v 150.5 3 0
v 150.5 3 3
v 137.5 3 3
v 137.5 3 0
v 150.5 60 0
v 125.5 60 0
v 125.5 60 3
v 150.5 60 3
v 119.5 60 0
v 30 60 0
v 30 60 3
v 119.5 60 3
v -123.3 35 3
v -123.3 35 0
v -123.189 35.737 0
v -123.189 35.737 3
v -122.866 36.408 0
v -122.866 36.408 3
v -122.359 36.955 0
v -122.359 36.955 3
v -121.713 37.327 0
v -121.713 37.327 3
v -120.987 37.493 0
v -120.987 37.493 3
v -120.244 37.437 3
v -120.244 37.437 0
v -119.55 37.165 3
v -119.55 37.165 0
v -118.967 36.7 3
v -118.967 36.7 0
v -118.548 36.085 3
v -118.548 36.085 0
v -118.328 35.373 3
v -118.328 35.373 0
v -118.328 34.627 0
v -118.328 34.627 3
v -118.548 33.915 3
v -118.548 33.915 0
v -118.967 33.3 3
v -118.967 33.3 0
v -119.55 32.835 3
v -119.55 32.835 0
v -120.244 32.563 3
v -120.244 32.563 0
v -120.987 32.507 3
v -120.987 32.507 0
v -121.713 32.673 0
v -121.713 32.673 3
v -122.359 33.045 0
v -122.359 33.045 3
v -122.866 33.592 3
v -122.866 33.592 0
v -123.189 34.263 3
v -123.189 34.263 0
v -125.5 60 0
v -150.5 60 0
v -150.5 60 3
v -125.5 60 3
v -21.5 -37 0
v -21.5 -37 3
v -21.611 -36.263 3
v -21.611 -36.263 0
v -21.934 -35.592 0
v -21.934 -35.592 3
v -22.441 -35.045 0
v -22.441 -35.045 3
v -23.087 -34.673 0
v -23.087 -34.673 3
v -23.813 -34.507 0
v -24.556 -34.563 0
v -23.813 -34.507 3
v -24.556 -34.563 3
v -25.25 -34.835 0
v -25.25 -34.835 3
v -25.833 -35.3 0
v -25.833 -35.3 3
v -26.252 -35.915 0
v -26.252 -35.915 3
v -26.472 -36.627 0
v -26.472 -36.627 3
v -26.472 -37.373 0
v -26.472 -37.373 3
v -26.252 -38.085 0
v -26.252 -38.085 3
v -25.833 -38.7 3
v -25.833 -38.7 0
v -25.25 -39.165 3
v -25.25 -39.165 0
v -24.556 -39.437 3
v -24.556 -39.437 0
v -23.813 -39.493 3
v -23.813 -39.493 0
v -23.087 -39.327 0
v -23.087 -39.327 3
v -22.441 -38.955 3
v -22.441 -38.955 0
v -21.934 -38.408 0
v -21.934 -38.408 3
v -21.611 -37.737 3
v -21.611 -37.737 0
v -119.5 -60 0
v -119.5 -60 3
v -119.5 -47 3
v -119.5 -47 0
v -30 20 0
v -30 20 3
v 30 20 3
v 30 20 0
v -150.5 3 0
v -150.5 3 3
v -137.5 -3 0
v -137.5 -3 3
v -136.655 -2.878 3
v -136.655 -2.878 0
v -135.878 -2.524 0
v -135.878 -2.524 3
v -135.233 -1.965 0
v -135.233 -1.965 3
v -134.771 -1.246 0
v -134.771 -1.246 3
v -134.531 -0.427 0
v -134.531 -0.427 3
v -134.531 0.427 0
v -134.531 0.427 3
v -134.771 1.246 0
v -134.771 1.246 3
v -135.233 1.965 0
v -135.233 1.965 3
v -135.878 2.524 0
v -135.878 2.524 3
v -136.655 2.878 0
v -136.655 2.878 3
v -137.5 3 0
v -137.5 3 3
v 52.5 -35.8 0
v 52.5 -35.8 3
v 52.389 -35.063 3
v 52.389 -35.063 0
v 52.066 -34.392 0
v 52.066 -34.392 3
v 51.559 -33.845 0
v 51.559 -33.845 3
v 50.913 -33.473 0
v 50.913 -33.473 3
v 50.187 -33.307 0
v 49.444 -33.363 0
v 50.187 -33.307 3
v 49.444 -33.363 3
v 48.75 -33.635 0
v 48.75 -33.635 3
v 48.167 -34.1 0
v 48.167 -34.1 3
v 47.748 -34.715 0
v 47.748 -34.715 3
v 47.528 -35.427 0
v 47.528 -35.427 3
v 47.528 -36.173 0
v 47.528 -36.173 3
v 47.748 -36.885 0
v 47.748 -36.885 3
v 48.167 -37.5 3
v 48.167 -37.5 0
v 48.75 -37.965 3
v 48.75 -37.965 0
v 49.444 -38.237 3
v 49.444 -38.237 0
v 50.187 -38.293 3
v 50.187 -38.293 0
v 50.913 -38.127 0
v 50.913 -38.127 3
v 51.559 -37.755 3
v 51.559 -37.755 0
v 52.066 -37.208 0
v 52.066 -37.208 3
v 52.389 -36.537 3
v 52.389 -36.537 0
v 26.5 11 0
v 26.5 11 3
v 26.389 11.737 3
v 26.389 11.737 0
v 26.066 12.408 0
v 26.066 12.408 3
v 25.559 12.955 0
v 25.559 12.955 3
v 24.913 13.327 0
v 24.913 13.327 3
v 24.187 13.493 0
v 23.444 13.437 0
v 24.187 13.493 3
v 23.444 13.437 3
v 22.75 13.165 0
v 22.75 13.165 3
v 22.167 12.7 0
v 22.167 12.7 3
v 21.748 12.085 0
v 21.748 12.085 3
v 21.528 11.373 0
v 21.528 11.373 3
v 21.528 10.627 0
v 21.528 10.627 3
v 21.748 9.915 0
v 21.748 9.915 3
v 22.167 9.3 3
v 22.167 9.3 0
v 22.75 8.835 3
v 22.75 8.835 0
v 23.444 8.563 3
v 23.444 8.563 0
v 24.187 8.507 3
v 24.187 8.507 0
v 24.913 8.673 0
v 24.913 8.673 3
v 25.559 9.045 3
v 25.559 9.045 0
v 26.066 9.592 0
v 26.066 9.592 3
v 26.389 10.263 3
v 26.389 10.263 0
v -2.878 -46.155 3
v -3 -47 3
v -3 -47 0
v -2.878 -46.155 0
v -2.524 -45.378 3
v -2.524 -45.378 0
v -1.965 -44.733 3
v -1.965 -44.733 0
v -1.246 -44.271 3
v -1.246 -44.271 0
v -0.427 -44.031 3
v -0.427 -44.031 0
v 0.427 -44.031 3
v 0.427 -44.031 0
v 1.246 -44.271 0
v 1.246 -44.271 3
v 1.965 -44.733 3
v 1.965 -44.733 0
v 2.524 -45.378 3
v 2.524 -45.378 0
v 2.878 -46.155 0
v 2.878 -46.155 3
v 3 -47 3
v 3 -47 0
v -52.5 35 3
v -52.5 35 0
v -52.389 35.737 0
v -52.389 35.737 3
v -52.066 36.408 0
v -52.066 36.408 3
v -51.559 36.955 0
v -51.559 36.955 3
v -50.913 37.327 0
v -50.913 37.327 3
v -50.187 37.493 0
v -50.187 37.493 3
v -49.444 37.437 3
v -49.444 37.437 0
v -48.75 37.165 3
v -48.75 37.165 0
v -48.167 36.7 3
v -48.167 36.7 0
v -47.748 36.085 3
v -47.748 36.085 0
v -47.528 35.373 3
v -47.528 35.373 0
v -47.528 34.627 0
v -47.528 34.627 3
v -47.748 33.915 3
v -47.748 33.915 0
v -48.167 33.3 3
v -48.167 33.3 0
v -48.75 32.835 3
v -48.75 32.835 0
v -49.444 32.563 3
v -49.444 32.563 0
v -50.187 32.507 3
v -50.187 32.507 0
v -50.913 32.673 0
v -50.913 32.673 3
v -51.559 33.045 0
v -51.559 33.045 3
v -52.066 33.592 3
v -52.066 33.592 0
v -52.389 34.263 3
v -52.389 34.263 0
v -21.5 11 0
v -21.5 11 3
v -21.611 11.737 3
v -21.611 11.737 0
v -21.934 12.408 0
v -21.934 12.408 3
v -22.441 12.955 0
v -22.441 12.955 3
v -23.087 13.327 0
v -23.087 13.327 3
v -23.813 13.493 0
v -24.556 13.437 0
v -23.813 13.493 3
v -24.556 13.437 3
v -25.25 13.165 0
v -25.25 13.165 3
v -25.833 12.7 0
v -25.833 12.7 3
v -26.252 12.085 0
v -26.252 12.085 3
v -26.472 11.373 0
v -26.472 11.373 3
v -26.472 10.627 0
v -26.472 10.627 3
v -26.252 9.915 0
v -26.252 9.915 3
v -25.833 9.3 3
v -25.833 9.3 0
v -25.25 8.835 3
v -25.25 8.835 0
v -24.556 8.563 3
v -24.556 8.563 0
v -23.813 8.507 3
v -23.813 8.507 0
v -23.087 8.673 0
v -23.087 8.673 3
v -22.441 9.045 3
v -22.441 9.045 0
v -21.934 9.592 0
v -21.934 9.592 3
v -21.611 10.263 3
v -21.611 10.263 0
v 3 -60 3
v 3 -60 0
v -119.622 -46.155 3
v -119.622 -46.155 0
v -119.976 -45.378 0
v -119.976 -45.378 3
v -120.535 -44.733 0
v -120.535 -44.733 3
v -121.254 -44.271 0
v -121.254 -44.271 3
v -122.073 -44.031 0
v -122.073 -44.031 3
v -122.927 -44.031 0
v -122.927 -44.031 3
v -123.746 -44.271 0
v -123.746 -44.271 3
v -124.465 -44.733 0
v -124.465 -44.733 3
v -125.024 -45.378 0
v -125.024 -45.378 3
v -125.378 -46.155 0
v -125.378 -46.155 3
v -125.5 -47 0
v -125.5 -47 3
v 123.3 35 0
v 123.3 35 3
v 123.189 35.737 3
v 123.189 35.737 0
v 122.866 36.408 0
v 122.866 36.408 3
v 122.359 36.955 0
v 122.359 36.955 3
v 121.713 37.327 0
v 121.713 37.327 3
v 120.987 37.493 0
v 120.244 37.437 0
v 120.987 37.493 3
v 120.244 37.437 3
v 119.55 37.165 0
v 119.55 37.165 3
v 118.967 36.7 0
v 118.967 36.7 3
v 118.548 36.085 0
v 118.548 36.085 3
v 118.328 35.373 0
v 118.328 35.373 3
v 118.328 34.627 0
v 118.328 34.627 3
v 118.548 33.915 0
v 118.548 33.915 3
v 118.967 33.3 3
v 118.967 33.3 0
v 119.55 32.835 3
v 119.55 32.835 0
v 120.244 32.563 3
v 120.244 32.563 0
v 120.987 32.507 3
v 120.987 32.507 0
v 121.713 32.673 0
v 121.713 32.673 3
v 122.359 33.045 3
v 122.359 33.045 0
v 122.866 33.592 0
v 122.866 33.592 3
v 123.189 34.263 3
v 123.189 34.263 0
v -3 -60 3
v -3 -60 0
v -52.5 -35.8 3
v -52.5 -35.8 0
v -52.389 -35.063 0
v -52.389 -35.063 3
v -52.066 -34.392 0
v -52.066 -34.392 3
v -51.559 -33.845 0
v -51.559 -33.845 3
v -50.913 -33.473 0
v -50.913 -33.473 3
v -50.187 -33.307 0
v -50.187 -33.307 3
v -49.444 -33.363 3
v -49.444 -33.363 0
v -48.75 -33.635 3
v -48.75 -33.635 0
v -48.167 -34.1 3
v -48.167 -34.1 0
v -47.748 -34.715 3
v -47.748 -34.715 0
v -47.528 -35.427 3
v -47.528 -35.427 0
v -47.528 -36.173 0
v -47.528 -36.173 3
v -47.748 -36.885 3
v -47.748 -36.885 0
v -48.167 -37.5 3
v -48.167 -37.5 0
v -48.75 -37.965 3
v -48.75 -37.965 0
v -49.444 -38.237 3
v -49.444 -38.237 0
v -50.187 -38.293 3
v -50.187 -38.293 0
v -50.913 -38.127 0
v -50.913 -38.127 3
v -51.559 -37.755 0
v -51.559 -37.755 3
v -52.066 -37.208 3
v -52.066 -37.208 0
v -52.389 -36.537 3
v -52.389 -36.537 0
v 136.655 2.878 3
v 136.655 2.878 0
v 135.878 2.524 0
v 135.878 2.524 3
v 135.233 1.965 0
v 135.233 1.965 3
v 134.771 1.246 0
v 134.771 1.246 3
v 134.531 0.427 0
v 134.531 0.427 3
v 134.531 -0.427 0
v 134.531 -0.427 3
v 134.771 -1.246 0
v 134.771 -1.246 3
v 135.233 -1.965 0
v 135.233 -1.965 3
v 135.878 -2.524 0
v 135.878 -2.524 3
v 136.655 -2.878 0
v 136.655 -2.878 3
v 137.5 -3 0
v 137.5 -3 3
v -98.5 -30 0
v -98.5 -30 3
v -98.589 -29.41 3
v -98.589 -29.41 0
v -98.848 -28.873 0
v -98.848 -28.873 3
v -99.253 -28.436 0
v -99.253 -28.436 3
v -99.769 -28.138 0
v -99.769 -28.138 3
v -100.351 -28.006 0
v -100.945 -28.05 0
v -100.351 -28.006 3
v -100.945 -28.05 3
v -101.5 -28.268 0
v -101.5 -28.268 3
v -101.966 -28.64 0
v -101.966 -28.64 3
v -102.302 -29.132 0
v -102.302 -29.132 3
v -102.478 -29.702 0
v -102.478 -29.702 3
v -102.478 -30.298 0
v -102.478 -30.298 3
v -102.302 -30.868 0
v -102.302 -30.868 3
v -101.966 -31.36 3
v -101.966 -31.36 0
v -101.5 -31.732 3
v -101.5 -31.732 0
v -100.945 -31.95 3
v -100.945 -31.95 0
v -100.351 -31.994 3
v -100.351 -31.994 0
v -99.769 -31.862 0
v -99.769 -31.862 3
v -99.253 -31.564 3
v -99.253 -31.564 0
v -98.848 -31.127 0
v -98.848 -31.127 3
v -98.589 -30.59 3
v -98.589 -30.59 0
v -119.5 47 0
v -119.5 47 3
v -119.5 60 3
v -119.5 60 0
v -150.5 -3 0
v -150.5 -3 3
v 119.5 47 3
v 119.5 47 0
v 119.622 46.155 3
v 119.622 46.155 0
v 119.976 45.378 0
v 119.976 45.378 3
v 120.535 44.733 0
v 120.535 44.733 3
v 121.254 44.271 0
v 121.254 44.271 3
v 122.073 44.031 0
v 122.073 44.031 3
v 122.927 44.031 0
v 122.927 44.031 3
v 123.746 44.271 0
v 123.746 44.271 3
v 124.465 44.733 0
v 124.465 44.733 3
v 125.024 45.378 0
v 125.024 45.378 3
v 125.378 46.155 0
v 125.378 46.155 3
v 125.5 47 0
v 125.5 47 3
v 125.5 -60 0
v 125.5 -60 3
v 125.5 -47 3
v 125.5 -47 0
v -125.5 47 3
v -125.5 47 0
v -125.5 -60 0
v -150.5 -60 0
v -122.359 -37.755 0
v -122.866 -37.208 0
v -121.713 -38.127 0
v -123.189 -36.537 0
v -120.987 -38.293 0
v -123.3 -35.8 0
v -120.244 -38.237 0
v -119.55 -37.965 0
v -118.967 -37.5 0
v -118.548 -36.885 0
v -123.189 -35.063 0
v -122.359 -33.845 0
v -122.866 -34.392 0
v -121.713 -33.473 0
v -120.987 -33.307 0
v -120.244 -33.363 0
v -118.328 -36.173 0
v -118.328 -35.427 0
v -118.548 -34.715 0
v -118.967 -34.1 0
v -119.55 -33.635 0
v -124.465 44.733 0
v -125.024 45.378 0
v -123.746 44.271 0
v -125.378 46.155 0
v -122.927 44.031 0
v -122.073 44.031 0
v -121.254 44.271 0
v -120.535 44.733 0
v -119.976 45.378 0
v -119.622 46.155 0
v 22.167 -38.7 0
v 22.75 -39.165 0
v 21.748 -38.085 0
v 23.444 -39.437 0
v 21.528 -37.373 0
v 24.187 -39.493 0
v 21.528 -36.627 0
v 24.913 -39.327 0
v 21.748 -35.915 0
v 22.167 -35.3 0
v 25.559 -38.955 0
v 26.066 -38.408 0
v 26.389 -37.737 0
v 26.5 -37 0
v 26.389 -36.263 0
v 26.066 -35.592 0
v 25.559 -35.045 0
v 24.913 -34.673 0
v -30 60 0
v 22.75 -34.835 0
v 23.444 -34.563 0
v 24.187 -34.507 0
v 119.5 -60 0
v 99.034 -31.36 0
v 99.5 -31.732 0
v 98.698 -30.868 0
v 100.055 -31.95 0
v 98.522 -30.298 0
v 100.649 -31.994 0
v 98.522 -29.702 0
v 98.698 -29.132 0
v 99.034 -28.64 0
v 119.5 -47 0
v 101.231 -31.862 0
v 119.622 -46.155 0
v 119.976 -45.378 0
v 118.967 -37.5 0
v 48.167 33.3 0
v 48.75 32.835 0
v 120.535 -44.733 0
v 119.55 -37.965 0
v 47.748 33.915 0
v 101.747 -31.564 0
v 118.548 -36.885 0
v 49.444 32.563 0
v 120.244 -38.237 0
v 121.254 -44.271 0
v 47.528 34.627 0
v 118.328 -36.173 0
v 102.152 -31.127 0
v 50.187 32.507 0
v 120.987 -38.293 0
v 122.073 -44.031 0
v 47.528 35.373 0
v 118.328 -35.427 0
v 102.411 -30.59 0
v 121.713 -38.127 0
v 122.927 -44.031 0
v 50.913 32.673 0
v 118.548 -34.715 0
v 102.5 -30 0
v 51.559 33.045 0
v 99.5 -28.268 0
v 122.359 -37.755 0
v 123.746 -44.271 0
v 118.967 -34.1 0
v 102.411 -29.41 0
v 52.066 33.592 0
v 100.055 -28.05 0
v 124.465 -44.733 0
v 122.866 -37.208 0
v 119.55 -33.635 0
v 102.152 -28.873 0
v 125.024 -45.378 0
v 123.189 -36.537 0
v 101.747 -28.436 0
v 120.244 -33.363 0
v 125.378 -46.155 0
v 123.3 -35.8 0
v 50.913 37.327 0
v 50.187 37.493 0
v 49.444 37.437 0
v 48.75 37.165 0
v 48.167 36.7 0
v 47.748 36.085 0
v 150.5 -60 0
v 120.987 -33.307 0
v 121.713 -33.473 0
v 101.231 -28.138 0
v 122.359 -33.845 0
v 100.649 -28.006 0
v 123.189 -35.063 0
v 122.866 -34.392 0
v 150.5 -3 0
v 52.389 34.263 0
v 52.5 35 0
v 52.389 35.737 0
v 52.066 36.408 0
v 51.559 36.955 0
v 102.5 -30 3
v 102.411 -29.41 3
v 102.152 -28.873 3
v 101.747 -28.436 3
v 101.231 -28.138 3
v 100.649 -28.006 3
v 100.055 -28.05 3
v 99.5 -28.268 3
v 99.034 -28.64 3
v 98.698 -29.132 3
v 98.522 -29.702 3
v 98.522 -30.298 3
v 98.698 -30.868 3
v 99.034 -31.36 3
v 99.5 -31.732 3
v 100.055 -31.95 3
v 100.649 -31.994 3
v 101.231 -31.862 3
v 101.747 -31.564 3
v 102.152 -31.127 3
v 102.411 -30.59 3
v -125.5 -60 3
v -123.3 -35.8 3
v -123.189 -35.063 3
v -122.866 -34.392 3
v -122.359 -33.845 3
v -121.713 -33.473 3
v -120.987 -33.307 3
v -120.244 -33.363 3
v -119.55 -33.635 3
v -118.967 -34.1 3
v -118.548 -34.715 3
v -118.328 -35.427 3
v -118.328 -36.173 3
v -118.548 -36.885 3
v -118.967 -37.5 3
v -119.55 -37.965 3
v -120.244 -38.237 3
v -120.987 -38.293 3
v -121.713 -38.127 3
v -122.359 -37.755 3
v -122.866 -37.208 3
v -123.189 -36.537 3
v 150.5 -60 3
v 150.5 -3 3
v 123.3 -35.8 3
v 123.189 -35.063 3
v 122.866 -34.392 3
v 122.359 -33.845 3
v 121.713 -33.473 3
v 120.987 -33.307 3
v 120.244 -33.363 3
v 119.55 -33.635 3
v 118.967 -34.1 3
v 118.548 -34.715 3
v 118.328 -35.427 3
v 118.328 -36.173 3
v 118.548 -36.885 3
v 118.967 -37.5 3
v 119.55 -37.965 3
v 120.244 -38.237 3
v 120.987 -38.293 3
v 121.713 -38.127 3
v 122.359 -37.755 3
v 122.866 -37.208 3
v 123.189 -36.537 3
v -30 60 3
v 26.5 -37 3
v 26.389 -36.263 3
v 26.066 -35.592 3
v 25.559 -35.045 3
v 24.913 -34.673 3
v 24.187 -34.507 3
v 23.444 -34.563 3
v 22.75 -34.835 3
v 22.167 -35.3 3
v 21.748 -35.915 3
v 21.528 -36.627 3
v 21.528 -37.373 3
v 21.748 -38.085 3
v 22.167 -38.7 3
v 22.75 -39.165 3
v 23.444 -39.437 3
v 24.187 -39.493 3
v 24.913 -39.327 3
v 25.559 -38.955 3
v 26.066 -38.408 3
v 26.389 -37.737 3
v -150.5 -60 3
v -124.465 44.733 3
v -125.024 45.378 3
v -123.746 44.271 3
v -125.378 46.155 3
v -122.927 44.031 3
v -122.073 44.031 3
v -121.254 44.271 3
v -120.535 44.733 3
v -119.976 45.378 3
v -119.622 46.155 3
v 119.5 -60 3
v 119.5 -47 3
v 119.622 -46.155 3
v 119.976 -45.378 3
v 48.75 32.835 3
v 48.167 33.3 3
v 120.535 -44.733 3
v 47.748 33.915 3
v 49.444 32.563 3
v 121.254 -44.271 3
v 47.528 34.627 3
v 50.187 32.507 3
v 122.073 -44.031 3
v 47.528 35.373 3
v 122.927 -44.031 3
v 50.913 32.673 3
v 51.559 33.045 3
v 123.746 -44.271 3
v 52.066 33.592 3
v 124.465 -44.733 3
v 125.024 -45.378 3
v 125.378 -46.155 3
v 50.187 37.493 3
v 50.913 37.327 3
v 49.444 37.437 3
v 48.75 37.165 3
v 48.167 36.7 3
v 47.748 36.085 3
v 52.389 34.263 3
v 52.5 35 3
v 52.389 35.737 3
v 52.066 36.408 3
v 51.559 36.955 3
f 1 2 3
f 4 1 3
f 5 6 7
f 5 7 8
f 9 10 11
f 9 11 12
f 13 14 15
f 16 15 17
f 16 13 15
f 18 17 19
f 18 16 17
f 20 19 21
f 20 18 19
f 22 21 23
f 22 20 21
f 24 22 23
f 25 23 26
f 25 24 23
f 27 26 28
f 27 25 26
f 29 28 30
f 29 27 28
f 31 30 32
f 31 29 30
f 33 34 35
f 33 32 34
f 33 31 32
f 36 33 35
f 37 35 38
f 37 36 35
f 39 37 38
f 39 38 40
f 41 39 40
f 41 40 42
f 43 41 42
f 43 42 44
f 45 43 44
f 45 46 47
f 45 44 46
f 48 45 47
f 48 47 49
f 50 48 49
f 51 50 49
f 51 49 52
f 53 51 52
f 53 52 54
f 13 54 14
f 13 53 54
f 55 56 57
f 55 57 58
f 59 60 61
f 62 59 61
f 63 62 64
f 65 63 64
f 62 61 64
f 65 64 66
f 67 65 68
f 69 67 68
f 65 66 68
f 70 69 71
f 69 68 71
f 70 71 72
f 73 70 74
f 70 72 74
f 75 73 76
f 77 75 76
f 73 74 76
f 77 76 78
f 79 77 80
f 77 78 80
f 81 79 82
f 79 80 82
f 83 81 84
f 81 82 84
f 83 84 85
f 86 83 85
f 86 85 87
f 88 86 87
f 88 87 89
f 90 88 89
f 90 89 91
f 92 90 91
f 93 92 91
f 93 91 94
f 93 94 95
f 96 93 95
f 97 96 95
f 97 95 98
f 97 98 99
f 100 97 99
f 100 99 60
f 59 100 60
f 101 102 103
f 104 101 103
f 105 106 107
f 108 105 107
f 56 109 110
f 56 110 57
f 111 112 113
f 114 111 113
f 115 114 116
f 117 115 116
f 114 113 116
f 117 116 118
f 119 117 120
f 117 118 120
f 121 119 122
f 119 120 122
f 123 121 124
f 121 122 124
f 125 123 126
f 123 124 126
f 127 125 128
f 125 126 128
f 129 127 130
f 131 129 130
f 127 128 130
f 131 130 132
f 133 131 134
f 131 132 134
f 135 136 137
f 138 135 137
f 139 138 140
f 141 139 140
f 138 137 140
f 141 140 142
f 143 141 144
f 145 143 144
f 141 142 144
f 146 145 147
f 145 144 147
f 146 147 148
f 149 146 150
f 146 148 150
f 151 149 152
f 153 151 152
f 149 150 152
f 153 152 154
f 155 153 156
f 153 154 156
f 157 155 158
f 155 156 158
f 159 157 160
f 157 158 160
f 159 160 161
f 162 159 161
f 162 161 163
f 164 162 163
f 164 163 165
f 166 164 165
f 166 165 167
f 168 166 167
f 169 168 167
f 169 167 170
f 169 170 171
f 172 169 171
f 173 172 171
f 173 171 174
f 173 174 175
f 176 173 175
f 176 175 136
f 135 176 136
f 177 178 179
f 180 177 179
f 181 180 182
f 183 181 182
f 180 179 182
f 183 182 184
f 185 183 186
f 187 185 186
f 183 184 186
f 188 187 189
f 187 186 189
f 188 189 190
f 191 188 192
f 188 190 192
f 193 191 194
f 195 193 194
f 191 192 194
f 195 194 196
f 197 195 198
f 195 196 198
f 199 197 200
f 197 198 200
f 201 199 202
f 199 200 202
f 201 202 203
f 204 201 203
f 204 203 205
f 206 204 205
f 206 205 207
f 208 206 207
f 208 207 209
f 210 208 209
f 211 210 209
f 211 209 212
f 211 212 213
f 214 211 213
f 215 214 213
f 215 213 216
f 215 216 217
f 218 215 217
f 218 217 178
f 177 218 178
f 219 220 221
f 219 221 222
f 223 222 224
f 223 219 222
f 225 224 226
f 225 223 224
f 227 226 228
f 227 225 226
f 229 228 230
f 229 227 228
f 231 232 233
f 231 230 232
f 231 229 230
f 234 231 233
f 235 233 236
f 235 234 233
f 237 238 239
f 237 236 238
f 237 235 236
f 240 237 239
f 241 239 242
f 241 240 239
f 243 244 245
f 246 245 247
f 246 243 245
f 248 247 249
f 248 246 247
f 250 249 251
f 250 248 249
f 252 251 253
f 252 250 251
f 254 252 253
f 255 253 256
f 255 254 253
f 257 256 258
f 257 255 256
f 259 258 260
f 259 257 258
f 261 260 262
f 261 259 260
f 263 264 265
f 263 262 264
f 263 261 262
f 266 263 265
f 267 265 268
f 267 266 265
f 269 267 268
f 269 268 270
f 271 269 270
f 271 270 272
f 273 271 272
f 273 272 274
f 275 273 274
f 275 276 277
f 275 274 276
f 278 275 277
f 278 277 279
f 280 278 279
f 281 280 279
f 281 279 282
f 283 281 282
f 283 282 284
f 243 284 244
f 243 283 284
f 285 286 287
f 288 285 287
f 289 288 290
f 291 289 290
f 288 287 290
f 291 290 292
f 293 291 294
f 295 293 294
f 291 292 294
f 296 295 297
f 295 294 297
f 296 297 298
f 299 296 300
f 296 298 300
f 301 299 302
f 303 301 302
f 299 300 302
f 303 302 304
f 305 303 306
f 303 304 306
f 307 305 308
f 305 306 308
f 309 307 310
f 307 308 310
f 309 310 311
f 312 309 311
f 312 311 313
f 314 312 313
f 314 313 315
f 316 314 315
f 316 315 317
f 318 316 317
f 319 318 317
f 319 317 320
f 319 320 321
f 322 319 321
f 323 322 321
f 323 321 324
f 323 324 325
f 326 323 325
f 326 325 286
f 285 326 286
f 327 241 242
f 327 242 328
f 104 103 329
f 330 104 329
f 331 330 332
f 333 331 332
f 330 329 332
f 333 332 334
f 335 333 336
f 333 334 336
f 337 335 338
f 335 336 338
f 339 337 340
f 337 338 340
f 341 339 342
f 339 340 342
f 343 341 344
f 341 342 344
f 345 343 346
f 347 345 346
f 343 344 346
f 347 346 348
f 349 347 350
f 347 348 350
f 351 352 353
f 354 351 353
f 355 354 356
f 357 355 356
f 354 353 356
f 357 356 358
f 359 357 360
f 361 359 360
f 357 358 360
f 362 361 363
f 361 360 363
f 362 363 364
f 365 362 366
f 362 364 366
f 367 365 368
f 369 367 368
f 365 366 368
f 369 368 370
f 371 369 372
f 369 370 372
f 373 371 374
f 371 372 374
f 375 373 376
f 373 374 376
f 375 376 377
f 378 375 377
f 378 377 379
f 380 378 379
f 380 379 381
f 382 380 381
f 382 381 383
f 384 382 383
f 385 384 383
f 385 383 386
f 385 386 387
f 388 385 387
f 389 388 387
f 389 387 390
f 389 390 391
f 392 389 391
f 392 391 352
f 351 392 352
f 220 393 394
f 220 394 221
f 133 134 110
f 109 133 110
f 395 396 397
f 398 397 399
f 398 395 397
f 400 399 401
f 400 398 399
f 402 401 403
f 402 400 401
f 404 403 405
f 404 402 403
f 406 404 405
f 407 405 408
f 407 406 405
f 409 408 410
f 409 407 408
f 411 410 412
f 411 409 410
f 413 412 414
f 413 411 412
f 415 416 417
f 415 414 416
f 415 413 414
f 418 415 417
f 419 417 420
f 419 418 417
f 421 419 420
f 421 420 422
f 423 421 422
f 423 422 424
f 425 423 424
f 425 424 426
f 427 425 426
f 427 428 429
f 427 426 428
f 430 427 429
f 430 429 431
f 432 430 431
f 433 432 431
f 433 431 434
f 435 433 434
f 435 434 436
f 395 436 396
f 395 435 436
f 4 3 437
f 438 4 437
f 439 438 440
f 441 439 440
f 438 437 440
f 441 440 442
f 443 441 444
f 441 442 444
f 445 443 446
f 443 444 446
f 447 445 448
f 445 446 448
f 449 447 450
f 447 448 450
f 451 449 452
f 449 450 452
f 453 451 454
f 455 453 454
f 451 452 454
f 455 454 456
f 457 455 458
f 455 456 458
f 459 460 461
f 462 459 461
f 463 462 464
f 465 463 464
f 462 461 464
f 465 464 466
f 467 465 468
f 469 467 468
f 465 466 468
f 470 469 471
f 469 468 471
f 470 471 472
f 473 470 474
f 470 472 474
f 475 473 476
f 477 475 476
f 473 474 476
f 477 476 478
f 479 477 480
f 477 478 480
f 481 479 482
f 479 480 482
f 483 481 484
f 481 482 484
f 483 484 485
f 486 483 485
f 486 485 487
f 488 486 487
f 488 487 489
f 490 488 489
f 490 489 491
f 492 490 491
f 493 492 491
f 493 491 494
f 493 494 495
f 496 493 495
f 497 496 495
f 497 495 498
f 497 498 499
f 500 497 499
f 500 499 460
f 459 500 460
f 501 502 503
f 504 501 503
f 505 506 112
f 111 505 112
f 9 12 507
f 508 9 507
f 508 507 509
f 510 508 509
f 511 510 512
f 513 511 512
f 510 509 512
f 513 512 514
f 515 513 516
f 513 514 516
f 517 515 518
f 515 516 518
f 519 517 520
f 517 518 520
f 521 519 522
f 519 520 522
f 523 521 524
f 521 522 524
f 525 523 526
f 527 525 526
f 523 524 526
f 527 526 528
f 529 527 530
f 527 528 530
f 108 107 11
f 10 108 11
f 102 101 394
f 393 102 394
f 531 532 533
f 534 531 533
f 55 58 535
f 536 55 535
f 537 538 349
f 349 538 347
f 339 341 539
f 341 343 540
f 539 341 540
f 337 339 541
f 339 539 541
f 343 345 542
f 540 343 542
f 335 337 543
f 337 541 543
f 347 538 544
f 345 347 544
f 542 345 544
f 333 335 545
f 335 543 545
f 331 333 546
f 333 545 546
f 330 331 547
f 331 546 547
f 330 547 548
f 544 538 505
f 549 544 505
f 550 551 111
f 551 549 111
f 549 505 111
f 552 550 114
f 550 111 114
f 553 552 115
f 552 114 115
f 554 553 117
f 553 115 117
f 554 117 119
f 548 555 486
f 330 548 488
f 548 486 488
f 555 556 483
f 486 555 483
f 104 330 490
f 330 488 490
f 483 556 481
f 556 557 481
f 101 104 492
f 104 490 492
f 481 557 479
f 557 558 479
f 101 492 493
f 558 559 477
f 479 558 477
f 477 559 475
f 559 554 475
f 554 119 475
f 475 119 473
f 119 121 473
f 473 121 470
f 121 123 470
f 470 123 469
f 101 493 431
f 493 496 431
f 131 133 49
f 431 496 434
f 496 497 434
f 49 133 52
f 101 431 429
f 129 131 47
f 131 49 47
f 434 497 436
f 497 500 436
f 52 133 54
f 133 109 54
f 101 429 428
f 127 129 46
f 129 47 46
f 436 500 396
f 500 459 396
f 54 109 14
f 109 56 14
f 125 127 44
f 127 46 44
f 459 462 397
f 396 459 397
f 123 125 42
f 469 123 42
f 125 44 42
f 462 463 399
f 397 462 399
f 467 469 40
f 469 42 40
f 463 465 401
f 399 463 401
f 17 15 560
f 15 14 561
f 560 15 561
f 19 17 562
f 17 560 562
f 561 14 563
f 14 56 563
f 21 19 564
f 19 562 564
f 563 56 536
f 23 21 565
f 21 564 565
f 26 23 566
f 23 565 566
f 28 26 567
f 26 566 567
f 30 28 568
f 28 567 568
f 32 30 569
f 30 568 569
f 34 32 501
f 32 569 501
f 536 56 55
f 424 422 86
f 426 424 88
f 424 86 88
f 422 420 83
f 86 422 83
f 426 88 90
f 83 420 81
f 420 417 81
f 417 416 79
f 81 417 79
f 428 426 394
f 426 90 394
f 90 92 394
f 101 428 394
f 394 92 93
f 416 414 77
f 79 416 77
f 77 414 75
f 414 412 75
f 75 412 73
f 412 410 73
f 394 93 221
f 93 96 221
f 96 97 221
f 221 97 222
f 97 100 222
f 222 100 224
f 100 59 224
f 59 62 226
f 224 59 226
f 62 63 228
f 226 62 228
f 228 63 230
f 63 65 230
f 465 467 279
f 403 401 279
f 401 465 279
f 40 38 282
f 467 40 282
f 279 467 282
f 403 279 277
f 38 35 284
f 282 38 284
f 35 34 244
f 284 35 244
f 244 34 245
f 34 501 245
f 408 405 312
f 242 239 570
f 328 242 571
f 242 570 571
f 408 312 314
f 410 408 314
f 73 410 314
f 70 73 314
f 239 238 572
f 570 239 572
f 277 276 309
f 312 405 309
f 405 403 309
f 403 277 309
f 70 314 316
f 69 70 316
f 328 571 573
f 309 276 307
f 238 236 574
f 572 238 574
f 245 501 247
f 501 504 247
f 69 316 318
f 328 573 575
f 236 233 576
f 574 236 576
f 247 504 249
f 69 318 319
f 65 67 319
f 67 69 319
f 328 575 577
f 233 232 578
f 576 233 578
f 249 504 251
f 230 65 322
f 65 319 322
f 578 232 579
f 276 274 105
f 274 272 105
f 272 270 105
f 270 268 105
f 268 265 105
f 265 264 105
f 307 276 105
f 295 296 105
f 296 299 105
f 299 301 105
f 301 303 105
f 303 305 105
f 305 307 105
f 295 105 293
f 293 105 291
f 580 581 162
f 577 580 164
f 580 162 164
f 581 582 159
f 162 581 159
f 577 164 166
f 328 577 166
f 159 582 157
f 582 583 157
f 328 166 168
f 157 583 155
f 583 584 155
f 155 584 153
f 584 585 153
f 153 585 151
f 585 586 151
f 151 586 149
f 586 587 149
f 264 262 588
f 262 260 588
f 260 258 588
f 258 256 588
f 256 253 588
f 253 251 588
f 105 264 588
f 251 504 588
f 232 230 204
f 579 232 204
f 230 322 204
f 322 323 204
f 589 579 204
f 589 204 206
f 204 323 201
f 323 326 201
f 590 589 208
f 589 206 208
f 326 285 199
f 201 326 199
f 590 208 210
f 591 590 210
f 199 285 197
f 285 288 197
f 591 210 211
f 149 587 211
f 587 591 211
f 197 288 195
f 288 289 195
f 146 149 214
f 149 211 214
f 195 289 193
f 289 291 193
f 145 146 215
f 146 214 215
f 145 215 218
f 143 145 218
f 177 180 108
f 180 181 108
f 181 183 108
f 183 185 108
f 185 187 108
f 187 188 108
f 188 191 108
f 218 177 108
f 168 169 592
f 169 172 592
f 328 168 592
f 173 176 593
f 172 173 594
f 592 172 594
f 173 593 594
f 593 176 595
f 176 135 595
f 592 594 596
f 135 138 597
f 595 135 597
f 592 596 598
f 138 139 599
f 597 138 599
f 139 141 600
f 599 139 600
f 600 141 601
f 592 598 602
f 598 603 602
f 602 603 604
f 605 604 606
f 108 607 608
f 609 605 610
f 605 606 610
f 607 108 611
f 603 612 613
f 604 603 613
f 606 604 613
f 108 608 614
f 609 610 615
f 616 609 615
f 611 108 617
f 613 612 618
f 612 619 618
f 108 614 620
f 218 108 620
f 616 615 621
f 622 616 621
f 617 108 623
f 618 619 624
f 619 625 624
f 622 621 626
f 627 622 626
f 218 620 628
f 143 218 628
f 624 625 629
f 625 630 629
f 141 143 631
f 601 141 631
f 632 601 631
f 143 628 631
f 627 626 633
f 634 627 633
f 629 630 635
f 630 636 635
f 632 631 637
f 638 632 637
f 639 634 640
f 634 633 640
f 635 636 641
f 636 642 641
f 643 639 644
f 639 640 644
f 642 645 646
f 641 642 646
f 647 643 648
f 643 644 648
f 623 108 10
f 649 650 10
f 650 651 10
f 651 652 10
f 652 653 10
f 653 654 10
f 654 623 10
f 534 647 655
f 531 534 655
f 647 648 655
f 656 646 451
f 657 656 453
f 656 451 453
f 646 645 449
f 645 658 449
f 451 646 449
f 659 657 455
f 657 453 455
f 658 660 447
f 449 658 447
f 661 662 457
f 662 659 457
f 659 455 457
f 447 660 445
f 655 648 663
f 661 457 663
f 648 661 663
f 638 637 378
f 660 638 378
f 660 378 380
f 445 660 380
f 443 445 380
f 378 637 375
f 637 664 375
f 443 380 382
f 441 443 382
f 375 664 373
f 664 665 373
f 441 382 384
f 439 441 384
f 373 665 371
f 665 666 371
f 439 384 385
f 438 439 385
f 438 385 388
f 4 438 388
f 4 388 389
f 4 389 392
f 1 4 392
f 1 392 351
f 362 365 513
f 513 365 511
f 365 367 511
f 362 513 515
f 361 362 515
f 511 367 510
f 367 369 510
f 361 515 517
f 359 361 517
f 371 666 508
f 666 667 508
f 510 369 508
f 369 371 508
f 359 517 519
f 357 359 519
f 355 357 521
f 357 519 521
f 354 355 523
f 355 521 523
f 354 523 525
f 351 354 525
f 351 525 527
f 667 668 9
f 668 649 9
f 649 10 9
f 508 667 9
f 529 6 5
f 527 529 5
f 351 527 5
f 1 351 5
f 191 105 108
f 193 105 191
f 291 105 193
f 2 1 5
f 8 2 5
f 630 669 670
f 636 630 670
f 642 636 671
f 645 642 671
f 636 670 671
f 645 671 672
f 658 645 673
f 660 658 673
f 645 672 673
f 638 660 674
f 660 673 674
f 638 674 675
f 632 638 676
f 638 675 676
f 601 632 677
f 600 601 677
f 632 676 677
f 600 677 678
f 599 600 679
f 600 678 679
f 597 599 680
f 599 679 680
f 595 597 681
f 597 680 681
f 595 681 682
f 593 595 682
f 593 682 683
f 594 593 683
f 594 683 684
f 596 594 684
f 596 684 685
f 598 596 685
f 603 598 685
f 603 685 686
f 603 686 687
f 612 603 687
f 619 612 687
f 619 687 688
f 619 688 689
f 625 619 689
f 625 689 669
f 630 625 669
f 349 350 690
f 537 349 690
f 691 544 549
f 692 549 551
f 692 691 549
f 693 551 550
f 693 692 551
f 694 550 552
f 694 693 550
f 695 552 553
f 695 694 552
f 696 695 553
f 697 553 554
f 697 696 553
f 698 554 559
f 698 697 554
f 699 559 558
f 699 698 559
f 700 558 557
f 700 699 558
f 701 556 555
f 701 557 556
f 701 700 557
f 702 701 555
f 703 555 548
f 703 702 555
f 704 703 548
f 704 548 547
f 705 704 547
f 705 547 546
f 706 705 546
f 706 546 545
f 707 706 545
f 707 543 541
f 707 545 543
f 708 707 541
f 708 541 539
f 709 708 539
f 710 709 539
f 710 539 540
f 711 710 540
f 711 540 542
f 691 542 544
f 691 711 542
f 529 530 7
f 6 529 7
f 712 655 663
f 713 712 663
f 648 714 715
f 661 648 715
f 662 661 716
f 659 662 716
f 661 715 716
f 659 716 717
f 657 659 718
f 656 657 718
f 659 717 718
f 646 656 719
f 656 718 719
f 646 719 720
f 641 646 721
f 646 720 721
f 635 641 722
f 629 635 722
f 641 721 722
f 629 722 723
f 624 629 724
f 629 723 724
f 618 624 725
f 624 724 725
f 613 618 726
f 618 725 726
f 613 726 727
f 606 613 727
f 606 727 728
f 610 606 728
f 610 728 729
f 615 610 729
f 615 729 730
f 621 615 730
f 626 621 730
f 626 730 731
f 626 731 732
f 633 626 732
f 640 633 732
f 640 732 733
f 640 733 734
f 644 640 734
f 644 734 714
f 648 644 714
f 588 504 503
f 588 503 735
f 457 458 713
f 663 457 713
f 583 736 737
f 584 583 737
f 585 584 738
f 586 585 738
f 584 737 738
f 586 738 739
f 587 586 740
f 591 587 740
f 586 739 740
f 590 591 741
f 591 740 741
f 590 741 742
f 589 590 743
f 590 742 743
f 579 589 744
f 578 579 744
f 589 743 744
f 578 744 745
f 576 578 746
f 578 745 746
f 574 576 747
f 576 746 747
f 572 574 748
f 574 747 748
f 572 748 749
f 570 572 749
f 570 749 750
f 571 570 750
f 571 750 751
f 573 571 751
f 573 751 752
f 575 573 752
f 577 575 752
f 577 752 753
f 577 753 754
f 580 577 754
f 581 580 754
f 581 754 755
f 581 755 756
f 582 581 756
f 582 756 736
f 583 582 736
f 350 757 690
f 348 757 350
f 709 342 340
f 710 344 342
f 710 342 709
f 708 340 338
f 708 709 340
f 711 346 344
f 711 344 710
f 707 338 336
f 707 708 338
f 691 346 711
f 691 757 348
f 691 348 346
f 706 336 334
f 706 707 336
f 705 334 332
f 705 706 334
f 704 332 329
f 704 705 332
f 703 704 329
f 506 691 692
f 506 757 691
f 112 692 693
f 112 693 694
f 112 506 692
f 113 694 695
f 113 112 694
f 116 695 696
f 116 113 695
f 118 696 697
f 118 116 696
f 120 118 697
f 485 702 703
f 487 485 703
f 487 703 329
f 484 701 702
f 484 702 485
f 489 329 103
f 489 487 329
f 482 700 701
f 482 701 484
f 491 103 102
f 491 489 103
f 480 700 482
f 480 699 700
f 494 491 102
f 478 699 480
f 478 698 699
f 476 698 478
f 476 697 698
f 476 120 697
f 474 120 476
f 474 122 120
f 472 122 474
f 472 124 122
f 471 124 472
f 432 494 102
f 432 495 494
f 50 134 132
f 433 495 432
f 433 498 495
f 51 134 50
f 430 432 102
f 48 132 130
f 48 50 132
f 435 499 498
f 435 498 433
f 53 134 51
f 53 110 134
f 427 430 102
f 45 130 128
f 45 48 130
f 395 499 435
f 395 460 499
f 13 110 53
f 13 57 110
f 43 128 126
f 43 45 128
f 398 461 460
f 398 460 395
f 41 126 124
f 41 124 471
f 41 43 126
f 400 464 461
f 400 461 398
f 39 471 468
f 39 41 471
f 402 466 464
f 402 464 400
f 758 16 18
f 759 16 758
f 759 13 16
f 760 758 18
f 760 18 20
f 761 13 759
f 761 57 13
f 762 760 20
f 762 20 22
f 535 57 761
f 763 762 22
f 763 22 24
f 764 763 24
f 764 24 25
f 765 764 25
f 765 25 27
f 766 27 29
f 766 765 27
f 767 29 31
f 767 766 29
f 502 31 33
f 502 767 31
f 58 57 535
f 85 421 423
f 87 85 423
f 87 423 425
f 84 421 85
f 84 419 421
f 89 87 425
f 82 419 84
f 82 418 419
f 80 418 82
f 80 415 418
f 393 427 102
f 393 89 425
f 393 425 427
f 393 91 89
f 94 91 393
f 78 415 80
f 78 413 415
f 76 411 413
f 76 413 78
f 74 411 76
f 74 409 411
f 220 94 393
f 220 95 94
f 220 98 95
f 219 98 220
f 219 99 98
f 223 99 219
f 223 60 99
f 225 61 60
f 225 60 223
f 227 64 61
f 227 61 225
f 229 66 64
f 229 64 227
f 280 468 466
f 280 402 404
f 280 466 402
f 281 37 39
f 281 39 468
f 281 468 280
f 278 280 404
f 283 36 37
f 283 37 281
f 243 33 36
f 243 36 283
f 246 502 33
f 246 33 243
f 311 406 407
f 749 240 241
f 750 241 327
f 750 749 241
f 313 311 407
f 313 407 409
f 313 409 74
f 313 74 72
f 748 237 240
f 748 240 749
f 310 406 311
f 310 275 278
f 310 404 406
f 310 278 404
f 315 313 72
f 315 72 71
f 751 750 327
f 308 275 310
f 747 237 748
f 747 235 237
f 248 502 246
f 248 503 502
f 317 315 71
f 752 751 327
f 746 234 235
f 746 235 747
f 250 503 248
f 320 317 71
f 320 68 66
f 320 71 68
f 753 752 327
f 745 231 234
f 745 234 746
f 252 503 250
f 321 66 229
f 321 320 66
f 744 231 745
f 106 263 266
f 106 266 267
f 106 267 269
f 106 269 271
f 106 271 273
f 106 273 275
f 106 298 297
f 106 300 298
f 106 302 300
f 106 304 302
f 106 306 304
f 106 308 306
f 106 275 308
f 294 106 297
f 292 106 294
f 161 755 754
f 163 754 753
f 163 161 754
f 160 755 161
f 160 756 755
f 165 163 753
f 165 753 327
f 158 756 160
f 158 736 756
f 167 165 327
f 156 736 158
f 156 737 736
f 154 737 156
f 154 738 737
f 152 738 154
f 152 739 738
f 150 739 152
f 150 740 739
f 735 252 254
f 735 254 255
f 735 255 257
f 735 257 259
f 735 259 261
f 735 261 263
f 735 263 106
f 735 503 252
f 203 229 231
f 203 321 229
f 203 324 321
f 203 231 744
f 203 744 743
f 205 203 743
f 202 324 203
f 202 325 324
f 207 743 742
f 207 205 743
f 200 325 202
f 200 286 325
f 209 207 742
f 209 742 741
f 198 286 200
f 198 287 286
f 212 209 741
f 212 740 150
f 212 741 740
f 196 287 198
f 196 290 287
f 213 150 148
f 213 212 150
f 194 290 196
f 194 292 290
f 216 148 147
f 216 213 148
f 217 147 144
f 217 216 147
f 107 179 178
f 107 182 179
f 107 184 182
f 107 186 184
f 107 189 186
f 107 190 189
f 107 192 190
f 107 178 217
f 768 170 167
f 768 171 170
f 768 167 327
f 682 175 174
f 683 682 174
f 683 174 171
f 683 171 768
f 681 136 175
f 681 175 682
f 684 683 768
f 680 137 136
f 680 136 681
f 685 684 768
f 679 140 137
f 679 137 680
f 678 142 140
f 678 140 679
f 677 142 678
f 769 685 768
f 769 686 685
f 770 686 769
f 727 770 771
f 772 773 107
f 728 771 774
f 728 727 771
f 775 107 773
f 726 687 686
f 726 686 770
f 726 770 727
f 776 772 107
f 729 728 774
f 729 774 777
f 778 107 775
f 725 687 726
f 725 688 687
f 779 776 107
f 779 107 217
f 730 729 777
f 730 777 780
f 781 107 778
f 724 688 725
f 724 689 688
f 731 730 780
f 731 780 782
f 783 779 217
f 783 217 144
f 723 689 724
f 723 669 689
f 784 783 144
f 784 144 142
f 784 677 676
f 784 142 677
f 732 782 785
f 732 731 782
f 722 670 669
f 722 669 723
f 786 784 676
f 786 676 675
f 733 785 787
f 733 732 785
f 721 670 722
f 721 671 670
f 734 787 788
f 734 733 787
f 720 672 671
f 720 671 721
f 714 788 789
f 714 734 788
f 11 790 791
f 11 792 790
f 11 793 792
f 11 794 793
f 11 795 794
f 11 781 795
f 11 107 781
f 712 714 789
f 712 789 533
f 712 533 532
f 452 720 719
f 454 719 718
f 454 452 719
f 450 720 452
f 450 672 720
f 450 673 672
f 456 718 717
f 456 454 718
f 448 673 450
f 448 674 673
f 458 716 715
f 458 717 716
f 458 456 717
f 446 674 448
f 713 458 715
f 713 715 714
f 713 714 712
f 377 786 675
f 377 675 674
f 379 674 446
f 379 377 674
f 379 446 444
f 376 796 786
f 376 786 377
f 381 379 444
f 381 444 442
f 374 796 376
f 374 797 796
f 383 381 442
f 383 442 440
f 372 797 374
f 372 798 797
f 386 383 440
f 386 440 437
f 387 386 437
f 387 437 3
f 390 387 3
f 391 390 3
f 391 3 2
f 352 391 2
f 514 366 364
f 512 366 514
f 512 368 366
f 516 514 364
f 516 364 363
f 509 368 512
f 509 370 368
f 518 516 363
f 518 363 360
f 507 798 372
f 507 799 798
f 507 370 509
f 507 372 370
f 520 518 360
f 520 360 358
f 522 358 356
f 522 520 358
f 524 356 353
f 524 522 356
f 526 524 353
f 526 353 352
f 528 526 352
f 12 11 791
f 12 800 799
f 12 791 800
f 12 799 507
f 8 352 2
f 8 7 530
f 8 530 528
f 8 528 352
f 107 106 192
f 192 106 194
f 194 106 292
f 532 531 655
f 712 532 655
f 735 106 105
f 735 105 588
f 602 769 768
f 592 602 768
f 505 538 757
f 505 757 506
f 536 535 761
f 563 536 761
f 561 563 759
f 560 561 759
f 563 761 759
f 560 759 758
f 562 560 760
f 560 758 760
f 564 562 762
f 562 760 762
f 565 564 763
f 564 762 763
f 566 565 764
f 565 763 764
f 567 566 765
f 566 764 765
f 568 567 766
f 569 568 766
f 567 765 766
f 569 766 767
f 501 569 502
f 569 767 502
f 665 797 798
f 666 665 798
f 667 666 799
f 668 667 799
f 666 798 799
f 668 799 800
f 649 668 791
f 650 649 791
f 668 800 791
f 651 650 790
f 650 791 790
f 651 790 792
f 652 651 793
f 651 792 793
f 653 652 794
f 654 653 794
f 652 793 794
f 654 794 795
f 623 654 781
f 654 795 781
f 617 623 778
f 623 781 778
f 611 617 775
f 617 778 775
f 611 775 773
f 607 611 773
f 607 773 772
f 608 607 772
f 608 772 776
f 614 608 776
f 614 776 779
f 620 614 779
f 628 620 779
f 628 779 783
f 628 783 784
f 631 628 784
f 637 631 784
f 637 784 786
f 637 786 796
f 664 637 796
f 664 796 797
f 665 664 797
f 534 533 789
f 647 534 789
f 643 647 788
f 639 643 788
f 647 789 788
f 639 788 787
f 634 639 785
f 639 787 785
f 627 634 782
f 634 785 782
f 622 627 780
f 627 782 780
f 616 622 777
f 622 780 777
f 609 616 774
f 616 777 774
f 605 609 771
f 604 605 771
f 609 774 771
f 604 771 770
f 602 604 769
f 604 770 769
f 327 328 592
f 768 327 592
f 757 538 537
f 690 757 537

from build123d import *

# Parameters (mm, degrees)
SKETCH1_W           = 301
SKETCH1_H           = 120
BOSS_EXTRUDE1_DEPTH = 3
SKETCH2_W           = 60
SKETCH2_H           = 40
CUT_EXTRUDE1_DEPTH  = 3
CUT_EXTRUDE2_DEPTH  = 10
SKETCH5_R           = 2.5
CUT_EXTRUDE3_DEPTH  = 10
SKETCH6_R           = 2.5
CUT_EXTRUDE4_DEPTH  = 10
SKETCH7_R           = 2
CUT_EXTRUDE5_DEPTH  = 10


with BuildPart() as part:
    # Sketch1 → Boss-Extrude1 (new body)
    with BuildSketch(Plane.XY):
        Rectangle(SKETCH1_W, SKETCH1_H)
    extrude(amount=BOSS_EXTRUDE1_DEPTH)

    # Sketch2 → Cut-Extrude1 (cut)
    with BuildSketch(Plane.XY.offset(3)):
        with Locations((0, 40)):
            Rectangle(SKETCH2_W, SKETCH2_H)
    extrude(amount=-CUT_EXTRUDE1_DEPTH, mode=Mode.SUBTRACT)

    # Sketch4 → Cut-Extrude2 (cut)
    with BuildSketch(Plane.XY.offset(3)):
        with BuildLine():
            Line((-125.5, -47), (-125.5, -60))
            Line((-125.5, -60), (-119.5, -60))
            Line((-119.5, -60), (-119.5, -47))
            ThreePointArc((-119.5, -47), (-122.5, -44), (-125.5, -47))
        make_face()
        with BuildLine():
            Line((-150.5, 3), (-150.5, -3))
            Line((-150.5, -3), (-137.5, -3))
            ThreePointArc((-137.5, -3), (-134.5, 0), (-137.5, 3))
            Line((-137.5, 3), (-150.5, 3))
        make_face()
        with BuildLine():
            Line((119.5, -47), (119.5, -60))
            Line((119.5, -60), (125.5, -60))
            Line((125.5, -60), (125.5, -47))
            ThreePointArc((125.5, -47), (122.5, -44), (119.5, -47))
        make_face()
        with BuildLine():
            Line((137.5, -3), (150.5, -3))
            Line((150.5, -3), (150.5, 3))
            Line((150.5, 3), (137.5, 3))
            ThreePointArc((137.5, 3), (134.5, 0), (137.5, -3))
        make_face()
        with BuildLine():
            Line((125.5, 47), (125.5, 60))
            Line((125.5, 60), (119.5, 60))
            Line((119.5, 60), (119.5, 47))
            ThreePointArc((119.5, 47), (122.5, 44), (125.5, 47))
        make_face()
        with BuildLine():
            Line((-119.5, 47), (-119.5, 60))
            Line((-119.5, 60), (-125.5, 60))
            Line((-125.5, 60), (-125.5, 47))
            ThreePointArc((-125.5, 47), (-122.5, 44), (-119.5, 47))
        make_face()
        with BuildLine():
            Line((3, -47), (3, -60))
            Line((3, -60), (-3, -60))
            Line((-3, -60), (-3, -47))
            ThreePointArc((-3, -47), (0, -44), (3, -47))
        make_face()
    extrude(amount=-CUT_EXTRUDE2_DEPTH, mode=Mode.SUBTRACT)

    # Sketch5 → Cut-Extrude3 (cut)
    with BuildSketch(Plane.XY.offset(3)):
        with Locations((120.8, 35)):
            Circle(SKETCH5_R)
        with Locations((120.8, -35.8)):
            Circle(SKETCH5_R)
        with Locations((50, -35.8)):
            Circle(SKETCH5_R)
        with Locations((50, 35)):
            Circle(SKETCH5_R)
    cut_extrude3 = extrude(amount=-CUT_EXTRUDE3_DEPTH, mode=Mode.SUBTRACT)

    # Mirror1: Cut-Extrude3 across plane
    add(cut_extrude3.mirror(Plane.ZY), mode=Mode.SUBTRACT)

    # Sketch6 → Cut-Extrude4 (cut)
    with BuildSketch(Plane.XY.offset(3)):
        with Locations((24, 11)):
            Circle(SKETCH6_R)
        with Locations((-24, 11)):
            Circle(SKETCH6_R)
        with Locations((-24, -37)):
            Circle(SKETCH6_R)
        with Locations((24, -37)):
            Circle(SKETCH6_R)
    extrude(amount=-CUT_EXTRUDE4_DEPTH, mode=Mode.SUBTRACT)

    # Sketch7 → Cut-Extrude5 (cut)
    with BuildSketch(Plane.XY.offset(3)):
        with Locations((-100.5, -30)):
            Circle(SKETCH7_R)
        with Locations((100.5, -30)):
            Circle(SKETCH7_R)
    extrude(amount=-CUT_EXTRUDE5_DEPTH, mode=Mode.SUBTRACT)


solid = part.part
